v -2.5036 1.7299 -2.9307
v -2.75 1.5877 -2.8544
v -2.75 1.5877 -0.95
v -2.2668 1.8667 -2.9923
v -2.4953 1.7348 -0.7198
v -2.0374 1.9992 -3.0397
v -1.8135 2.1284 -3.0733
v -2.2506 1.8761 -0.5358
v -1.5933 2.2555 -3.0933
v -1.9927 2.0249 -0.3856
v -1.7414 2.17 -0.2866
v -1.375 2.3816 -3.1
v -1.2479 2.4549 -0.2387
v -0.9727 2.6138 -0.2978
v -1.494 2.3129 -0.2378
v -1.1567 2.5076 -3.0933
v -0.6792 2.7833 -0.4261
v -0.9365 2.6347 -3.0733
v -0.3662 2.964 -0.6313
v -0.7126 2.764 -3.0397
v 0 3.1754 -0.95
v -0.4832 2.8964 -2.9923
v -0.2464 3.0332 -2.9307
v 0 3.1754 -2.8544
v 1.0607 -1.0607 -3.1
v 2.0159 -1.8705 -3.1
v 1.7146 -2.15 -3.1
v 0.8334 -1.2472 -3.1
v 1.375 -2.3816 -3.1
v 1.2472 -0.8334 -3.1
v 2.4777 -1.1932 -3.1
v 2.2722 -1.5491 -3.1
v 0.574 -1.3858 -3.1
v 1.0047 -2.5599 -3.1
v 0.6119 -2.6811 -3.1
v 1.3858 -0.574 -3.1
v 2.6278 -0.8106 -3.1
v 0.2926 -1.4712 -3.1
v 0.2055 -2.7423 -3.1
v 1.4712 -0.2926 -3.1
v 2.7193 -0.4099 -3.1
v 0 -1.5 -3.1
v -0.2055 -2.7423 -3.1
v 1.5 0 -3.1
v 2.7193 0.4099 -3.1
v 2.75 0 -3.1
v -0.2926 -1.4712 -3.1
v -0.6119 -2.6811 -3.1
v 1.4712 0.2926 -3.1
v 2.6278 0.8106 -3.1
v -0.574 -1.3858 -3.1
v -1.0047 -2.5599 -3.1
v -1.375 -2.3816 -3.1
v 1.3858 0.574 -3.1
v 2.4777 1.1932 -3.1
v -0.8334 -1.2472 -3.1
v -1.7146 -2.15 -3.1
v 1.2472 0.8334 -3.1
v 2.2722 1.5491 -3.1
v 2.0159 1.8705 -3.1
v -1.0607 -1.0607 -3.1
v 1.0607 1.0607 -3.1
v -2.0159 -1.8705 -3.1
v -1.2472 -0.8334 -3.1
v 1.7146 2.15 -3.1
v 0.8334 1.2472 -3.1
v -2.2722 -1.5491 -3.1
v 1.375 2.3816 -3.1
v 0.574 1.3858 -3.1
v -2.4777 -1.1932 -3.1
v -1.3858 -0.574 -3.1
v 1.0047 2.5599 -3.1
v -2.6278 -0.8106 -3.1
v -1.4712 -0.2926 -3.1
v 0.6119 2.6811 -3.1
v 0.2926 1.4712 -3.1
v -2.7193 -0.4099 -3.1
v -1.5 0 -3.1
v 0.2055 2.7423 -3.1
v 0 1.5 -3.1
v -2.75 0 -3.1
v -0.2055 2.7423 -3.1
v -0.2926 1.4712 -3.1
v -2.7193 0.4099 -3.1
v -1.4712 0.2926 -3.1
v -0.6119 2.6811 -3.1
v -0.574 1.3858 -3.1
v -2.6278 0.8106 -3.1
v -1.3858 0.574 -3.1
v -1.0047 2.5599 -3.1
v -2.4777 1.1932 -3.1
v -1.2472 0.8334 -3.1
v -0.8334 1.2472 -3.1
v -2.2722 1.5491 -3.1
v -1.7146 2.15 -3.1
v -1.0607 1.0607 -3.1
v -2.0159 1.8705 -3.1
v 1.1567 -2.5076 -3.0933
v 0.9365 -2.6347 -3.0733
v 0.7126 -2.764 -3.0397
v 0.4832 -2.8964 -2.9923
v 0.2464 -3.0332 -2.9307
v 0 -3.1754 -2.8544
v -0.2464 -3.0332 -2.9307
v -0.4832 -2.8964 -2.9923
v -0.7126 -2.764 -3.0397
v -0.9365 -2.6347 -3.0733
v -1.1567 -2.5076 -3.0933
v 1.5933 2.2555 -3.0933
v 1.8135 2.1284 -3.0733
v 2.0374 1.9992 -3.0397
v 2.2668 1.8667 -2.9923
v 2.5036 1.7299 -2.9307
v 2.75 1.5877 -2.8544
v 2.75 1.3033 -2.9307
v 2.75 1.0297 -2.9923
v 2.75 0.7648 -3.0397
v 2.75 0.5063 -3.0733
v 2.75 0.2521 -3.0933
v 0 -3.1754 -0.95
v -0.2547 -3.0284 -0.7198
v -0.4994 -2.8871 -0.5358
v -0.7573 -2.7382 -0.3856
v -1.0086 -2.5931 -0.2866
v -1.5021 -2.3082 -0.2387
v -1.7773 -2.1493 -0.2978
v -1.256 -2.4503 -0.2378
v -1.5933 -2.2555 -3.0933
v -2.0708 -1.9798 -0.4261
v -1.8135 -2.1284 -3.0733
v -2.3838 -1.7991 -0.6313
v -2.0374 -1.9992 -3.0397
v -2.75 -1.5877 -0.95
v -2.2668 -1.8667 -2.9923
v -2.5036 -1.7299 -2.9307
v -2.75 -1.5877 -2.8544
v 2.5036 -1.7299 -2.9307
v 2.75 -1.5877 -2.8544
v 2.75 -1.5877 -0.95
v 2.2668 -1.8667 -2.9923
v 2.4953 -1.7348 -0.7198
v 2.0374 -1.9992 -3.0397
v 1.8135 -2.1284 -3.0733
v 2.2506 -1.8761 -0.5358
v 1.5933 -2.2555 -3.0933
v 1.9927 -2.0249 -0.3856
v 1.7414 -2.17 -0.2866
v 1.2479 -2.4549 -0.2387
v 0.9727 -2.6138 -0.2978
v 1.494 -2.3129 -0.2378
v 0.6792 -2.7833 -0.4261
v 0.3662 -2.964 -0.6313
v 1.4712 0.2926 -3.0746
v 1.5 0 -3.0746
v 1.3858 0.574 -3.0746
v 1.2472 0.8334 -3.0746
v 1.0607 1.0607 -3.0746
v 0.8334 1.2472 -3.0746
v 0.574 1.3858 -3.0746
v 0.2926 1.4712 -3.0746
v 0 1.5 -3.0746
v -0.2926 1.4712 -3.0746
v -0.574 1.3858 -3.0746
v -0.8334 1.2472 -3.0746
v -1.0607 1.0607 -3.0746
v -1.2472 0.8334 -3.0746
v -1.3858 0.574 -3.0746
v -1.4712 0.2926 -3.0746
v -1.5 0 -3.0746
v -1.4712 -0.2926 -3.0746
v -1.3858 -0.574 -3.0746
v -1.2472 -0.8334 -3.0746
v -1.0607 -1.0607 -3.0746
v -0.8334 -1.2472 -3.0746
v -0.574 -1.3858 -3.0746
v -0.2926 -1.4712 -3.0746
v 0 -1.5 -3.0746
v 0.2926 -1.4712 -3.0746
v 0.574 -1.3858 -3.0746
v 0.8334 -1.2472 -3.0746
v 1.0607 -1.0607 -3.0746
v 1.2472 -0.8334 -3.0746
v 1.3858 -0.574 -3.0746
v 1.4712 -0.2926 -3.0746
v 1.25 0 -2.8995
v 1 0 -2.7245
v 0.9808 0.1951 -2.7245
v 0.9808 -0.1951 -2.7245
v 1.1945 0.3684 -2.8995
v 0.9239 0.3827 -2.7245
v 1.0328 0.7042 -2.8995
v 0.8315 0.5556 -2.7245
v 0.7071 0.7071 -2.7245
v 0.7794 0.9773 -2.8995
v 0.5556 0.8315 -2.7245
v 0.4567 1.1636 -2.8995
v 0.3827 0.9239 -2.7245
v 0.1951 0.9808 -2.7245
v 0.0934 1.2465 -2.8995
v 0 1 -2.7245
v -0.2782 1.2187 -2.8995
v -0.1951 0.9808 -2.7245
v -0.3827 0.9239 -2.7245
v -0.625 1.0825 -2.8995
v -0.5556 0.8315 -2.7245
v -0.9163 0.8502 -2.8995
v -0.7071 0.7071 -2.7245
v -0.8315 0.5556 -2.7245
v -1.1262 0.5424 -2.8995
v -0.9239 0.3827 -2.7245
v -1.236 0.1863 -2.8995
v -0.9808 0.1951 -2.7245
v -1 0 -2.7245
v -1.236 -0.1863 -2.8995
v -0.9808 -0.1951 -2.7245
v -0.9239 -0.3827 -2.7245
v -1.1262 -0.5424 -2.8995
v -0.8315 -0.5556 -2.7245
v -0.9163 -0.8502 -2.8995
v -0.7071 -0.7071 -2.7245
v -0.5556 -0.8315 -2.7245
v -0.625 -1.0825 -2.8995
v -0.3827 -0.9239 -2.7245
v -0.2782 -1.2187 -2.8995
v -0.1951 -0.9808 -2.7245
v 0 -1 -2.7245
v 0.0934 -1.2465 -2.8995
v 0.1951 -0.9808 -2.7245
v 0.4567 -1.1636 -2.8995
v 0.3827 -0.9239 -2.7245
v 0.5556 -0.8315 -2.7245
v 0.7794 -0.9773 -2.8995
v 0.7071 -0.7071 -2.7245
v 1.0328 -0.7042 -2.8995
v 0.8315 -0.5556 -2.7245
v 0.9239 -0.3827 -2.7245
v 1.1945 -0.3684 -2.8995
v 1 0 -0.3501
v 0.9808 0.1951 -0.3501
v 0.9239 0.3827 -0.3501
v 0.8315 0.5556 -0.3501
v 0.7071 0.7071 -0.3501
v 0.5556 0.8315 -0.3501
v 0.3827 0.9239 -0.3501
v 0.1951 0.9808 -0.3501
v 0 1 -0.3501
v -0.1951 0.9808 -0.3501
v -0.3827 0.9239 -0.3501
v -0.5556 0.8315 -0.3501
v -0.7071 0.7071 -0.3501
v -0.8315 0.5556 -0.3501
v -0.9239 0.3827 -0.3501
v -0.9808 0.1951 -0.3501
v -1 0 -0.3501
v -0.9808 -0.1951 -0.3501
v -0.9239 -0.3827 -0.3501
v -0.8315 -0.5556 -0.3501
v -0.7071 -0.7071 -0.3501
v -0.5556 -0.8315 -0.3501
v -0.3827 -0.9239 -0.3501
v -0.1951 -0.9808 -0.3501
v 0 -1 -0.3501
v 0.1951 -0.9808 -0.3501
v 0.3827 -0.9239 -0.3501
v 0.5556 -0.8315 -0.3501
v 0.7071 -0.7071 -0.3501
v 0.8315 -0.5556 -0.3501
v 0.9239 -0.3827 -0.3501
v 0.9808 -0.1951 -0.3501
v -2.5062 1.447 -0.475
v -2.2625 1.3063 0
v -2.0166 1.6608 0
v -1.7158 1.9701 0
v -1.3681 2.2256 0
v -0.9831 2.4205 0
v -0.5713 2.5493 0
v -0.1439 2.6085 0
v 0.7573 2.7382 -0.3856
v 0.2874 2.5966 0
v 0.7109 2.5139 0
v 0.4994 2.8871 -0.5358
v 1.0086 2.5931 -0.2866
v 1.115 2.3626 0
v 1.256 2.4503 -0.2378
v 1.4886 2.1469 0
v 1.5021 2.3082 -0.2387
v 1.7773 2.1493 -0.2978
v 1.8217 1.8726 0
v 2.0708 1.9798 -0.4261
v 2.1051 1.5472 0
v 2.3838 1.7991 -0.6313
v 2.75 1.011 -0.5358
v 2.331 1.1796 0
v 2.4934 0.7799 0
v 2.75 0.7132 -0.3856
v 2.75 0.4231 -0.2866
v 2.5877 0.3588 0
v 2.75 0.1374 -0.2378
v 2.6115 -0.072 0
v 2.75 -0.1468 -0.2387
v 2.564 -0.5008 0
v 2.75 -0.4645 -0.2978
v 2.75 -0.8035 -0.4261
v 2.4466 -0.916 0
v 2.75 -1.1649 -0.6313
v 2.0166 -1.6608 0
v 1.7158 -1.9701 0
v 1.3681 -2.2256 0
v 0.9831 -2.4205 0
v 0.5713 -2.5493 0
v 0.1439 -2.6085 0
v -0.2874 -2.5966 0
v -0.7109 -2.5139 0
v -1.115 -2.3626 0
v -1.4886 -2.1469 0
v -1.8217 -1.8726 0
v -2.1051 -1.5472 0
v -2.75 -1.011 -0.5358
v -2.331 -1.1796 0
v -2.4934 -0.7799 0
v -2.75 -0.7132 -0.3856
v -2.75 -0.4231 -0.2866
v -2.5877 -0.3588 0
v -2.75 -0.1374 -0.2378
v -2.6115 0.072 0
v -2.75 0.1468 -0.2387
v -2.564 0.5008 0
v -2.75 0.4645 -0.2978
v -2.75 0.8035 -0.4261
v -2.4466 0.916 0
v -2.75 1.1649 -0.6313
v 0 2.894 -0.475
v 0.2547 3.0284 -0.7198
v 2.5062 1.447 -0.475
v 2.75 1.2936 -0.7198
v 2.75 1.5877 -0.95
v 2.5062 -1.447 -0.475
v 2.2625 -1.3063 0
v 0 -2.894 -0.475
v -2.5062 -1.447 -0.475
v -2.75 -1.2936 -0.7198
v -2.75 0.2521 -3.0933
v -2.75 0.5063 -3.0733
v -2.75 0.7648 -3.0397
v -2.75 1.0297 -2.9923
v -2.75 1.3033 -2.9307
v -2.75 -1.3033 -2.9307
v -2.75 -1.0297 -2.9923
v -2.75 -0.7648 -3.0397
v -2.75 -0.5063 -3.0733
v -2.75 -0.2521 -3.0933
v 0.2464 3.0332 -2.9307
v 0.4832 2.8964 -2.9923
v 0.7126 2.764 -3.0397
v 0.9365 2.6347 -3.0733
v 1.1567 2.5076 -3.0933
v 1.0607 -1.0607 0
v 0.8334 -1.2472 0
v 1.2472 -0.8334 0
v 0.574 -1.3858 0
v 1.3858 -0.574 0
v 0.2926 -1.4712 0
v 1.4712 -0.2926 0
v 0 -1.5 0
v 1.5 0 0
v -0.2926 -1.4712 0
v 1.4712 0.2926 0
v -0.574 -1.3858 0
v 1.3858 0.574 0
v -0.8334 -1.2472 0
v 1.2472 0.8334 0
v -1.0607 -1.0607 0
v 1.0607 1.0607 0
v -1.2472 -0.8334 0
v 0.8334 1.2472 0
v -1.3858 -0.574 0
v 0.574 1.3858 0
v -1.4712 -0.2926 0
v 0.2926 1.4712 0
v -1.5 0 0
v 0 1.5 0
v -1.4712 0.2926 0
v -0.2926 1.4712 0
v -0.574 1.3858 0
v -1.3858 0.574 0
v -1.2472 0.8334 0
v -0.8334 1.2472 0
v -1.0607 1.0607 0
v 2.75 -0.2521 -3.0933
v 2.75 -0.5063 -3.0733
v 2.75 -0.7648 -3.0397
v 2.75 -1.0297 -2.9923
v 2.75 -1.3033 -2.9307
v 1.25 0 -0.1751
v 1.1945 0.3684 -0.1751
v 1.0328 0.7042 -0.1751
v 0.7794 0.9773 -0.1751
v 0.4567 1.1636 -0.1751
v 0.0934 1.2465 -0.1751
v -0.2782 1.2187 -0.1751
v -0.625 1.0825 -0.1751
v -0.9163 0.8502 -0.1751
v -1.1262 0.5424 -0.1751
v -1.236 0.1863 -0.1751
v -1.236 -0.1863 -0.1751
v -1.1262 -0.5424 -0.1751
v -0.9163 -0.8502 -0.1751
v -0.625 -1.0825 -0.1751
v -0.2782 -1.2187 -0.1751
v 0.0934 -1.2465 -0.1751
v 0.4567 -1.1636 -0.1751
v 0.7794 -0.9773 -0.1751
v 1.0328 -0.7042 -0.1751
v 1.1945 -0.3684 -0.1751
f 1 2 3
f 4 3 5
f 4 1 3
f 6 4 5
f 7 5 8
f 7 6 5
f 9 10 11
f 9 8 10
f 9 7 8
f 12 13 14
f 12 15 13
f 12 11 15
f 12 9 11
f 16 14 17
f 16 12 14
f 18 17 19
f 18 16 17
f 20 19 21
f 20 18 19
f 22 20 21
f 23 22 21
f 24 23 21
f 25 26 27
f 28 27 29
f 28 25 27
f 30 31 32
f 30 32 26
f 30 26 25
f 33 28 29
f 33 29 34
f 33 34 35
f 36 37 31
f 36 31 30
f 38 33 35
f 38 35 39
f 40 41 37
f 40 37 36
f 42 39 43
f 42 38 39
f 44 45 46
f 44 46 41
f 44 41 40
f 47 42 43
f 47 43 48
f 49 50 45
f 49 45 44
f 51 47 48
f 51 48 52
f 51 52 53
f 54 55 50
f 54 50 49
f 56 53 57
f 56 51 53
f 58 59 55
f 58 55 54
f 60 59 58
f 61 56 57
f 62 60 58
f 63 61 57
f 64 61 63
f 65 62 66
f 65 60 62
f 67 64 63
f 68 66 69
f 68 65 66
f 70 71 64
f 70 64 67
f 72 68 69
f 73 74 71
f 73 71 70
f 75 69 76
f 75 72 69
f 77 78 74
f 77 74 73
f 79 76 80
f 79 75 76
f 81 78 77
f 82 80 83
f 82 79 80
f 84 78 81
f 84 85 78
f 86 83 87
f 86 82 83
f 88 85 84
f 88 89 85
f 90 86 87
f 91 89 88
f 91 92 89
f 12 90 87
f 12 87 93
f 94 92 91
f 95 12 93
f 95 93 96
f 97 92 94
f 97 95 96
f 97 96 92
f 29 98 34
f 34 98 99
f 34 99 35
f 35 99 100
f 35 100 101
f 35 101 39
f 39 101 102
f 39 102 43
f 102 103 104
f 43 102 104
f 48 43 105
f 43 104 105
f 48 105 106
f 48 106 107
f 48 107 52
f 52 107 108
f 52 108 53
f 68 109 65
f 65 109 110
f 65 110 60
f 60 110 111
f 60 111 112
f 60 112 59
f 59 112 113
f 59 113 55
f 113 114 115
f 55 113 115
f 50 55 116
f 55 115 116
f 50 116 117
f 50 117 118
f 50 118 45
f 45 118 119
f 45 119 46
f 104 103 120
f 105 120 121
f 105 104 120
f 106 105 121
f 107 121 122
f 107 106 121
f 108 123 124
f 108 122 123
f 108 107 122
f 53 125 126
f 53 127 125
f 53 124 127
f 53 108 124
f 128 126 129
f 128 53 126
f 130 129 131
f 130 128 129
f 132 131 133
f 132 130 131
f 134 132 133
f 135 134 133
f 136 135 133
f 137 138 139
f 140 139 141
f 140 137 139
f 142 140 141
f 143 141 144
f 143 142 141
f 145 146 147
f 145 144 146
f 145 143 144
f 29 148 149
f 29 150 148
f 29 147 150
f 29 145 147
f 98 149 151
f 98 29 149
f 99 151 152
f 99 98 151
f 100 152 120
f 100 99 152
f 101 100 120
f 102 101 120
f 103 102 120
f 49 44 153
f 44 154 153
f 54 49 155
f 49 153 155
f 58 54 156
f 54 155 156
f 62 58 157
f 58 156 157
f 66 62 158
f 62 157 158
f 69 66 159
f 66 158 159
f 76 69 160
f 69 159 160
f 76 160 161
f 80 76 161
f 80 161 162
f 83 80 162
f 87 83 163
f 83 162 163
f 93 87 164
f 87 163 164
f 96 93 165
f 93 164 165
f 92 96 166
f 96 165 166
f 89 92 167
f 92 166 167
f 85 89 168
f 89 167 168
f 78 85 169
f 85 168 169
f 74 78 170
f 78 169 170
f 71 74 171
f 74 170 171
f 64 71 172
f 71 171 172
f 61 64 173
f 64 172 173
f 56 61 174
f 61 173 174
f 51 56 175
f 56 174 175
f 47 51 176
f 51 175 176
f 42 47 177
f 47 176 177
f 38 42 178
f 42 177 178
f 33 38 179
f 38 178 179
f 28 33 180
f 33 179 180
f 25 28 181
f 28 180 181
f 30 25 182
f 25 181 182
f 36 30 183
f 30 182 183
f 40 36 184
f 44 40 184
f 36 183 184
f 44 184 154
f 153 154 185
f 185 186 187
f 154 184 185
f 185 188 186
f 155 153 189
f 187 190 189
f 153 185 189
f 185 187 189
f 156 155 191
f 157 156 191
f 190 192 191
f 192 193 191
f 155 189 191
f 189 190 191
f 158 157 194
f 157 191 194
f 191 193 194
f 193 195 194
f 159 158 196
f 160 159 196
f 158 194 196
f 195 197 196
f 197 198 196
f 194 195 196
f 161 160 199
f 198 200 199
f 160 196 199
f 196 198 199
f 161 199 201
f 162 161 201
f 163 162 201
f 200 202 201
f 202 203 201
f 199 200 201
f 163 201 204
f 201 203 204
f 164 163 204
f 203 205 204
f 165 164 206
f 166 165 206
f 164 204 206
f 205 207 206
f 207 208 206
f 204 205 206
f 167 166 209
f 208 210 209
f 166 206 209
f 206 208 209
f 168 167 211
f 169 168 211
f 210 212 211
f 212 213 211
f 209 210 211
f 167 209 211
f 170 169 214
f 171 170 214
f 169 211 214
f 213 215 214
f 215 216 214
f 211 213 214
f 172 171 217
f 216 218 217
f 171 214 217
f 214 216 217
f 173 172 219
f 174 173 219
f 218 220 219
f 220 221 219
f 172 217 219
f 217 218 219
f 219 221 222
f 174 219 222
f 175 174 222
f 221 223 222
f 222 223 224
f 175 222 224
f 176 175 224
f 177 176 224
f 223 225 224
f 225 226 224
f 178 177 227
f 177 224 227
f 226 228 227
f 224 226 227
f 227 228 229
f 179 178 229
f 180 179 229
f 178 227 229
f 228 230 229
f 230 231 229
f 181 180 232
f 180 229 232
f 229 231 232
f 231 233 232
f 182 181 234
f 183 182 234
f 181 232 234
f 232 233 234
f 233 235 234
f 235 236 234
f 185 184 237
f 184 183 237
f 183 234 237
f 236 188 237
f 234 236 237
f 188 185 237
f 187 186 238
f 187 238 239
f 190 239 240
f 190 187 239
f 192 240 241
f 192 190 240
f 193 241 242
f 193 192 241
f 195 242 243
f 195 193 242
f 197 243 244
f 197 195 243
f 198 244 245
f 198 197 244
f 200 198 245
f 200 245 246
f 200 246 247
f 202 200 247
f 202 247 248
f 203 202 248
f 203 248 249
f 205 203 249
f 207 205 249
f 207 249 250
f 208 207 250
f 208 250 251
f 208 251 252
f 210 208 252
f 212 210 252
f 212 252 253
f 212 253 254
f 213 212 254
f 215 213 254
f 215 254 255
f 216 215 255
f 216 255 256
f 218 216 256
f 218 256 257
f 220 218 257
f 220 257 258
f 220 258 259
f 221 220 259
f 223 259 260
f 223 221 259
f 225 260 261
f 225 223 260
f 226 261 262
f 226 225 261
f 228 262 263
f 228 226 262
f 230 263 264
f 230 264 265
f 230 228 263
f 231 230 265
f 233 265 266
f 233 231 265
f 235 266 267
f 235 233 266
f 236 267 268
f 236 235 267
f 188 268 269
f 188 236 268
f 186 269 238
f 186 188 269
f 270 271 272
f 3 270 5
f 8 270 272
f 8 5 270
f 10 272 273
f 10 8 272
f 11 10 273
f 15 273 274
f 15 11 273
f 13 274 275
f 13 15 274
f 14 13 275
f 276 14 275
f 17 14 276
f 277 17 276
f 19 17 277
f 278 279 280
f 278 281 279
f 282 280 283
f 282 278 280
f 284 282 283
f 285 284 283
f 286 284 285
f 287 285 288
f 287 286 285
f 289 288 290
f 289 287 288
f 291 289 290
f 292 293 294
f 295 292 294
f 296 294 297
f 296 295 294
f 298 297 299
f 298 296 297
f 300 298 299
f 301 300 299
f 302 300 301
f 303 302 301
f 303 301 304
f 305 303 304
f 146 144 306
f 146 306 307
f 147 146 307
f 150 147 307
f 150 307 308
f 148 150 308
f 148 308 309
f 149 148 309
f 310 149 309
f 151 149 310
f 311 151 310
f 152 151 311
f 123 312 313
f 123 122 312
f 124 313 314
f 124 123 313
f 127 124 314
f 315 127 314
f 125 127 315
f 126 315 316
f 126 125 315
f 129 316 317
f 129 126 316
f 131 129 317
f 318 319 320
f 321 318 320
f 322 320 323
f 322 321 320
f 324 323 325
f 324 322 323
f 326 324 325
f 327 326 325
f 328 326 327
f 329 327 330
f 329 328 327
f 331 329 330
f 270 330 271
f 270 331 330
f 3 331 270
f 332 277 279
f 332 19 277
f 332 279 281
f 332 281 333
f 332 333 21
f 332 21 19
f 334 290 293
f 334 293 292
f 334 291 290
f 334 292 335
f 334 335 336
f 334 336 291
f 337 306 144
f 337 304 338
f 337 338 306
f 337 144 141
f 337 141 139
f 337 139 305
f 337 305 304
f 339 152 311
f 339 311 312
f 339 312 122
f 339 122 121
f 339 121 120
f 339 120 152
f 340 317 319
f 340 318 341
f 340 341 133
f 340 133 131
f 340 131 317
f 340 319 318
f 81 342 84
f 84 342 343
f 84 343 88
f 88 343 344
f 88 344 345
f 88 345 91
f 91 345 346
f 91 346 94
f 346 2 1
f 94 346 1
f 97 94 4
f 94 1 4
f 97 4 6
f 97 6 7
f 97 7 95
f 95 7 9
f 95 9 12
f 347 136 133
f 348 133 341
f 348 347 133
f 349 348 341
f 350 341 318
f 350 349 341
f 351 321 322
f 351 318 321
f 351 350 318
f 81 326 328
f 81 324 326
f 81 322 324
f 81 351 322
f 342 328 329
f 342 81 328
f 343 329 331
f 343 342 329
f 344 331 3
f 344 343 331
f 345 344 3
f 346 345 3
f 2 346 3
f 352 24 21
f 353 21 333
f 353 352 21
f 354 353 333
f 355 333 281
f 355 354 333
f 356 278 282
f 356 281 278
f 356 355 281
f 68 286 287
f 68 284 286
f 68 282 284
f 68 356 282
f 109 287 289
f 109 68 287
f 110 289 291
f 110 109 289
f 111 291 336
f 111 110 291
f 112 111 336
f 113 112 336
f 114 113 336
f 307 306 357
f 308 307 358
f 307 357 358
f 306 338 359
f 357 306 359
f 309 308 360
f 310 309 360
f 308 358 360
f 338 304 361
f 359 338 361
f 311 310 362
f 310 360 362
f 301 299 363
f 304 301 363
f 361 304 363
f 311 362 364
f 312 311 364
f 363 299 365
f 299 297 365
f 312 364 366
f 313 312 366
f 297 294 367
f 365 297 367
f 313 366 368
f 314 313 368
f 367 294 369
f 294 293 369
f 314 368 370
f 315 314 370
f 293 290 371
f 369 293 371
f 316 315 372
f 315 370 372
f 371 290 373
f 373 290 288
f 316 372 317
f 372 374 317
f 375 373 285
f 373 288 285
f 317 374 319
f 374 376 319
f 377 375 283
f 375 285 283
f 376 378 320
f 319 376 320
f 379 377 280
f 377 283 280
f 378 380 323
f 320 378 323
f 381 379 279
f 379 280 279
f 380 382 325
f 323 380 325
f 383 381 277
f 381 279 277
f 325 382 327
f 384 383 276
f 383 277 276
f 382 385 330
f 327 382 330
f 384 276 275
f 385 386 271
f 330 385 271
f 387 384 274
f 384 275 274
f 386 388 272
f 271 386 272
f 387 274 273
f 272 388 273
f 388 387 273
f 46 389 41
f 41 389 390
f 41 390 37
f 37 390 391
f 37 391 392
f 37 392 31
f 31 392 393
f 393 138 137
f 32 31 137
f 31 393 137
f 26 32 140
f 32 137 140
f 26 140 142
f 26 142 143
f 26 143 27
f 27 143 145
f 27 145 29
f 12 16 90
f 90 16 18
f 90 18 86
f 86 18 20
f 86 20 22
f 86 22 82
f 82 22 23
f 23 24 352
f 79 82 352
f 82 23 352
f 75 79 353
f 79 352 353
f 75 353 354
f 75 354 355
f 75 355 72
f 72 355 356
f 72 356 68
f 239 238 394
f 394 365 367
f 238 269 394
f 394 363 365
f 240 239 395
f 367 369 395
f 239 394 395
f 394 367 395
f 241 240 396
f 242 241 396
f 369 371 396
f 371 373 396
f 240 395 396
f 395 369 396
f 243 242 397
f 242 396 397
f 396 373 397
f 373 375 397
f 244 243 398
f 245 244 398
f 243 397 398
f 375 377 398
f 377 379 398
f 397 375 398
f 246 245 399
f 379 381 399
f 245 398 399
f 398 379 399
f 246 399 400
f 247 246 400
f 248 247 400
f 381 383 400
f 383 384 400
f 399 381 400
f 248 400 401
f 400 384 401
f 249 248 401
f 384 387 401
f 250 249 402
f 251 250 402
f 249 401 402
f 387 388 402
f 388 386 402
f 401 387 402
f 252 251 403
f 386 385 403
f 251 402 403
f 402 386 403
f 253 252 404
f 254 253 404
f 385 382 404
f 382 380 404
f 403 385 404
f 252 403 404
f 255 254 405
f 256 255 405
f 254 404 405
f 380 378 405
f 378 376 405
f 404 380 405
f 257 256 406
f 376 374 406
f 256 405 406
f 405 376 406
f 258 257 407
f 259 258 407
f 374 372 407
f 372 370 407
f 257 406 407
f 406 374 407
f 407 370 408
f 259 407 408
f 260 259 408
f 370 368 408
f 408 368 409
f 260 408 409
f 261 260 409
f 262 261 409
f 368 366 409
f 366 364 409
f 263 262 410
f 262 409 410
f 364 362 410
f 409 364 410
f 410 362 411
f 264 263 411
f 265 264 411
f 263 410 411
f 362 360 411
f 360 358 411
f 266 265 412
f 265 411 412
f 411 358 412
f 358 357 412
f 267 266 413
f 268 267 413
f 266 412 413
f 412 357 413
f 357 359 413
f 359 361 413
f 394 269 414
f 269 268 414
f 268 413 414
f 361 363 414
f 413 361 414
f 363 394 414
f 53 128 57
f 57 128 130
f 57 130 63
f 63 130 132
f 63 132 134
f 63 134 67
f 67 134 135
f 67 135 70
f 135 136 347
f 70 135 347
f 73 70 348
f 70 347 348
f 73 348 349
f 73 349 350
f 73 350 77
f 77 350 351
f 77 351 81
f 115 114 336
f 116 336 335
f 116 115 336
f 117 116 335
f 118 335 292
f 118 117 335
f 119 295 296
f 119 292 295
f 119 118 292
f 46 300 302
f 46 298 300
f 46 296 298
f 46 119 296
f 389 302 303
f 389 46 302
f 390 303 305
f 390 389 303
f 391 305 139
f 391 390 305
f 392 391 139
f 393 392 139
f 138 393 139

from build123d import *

# Parameters (mm, degrees)
BASENUT_START = -3.1
BASENUTSKE_R  = 1
BASENUT_DEPTH = 3.1


# Read off the part's stored shape, not the designer's step: ThreadSchematic
with BuildPart() as part:
    # BaseNutSke → BaseNut (new body)
    with BuildSketch(Plane.XY.offset(BASENUT_START)):
        Polygon((2.75, 1.58771324), (2.75, -1.58771324), (0, -3.175426481), (-2.75, -1.58771324), (-2.75, 1.58771324), (0, 3.175426481), align=None)
        Circle(BASENUTSKE_R, mode=Mode.SUBTRACT)
    extrude(amount=BASENUT_DEPTH)

    # Sketch5 (on Front Plane) → EndChamfer (revolve, cut)
    with BuildSketch(Plane.XY):
        Polygon((3.0746, 1.5), (2.689485854, 0.95), (3.1254, 0.95), (3.1254, 1.5), align=None)
    revolve(axis=Axis((3.1254, 0.95, 0), (-1, 0, 0)), mode=Mode.SUBTRACT)

    # Sketch3 → Double-Chamfer (revolve, cut)
    with BuildSketch(Plane(origin=(0, 0, 0), x_dir=(0, 0, -1), z_dir=(1, 0, 0)), mode=Mode.PRIVATE) as double_chamfer_sk:
        Polygon((3.1, 2.75), (2.854379907, 3.175426481), (2.854379907, 13.175426481), (13.1, 13.175426481), (13.1, 2.75), align=None)
        Polygon((0.95, 13.175426481), (-10, 13.175426481), (-10, 2.6125), (0, 2.6125), (0.95, 3.175426481), align=None)
    revolve(double_chamfer_sk.sketch.rotate(Axis((0, 0, 0), (0, 0, -1)), 300.000001719), axis=Axis((0, 0, 0), (0, 0, -1)), mode=Mode.SUBTRACT)

    # ThreadSchematic outline → ThreadSchematic (revolve, cut)
    with BuildSketch(Plane.XZ):
        Polygon((1, 0), (1, -0.350103769), (1.5, 0), align=None)
        Polygon((1.5, -3.0746), (1, -2.724496231), (1, -3.1), (1.5, -3.1), align=None)
    revolve(axis=Axis((0, 0, 0), (0, 0, 1)), mode=Mode.SUBTRACT)


solid = part.part
